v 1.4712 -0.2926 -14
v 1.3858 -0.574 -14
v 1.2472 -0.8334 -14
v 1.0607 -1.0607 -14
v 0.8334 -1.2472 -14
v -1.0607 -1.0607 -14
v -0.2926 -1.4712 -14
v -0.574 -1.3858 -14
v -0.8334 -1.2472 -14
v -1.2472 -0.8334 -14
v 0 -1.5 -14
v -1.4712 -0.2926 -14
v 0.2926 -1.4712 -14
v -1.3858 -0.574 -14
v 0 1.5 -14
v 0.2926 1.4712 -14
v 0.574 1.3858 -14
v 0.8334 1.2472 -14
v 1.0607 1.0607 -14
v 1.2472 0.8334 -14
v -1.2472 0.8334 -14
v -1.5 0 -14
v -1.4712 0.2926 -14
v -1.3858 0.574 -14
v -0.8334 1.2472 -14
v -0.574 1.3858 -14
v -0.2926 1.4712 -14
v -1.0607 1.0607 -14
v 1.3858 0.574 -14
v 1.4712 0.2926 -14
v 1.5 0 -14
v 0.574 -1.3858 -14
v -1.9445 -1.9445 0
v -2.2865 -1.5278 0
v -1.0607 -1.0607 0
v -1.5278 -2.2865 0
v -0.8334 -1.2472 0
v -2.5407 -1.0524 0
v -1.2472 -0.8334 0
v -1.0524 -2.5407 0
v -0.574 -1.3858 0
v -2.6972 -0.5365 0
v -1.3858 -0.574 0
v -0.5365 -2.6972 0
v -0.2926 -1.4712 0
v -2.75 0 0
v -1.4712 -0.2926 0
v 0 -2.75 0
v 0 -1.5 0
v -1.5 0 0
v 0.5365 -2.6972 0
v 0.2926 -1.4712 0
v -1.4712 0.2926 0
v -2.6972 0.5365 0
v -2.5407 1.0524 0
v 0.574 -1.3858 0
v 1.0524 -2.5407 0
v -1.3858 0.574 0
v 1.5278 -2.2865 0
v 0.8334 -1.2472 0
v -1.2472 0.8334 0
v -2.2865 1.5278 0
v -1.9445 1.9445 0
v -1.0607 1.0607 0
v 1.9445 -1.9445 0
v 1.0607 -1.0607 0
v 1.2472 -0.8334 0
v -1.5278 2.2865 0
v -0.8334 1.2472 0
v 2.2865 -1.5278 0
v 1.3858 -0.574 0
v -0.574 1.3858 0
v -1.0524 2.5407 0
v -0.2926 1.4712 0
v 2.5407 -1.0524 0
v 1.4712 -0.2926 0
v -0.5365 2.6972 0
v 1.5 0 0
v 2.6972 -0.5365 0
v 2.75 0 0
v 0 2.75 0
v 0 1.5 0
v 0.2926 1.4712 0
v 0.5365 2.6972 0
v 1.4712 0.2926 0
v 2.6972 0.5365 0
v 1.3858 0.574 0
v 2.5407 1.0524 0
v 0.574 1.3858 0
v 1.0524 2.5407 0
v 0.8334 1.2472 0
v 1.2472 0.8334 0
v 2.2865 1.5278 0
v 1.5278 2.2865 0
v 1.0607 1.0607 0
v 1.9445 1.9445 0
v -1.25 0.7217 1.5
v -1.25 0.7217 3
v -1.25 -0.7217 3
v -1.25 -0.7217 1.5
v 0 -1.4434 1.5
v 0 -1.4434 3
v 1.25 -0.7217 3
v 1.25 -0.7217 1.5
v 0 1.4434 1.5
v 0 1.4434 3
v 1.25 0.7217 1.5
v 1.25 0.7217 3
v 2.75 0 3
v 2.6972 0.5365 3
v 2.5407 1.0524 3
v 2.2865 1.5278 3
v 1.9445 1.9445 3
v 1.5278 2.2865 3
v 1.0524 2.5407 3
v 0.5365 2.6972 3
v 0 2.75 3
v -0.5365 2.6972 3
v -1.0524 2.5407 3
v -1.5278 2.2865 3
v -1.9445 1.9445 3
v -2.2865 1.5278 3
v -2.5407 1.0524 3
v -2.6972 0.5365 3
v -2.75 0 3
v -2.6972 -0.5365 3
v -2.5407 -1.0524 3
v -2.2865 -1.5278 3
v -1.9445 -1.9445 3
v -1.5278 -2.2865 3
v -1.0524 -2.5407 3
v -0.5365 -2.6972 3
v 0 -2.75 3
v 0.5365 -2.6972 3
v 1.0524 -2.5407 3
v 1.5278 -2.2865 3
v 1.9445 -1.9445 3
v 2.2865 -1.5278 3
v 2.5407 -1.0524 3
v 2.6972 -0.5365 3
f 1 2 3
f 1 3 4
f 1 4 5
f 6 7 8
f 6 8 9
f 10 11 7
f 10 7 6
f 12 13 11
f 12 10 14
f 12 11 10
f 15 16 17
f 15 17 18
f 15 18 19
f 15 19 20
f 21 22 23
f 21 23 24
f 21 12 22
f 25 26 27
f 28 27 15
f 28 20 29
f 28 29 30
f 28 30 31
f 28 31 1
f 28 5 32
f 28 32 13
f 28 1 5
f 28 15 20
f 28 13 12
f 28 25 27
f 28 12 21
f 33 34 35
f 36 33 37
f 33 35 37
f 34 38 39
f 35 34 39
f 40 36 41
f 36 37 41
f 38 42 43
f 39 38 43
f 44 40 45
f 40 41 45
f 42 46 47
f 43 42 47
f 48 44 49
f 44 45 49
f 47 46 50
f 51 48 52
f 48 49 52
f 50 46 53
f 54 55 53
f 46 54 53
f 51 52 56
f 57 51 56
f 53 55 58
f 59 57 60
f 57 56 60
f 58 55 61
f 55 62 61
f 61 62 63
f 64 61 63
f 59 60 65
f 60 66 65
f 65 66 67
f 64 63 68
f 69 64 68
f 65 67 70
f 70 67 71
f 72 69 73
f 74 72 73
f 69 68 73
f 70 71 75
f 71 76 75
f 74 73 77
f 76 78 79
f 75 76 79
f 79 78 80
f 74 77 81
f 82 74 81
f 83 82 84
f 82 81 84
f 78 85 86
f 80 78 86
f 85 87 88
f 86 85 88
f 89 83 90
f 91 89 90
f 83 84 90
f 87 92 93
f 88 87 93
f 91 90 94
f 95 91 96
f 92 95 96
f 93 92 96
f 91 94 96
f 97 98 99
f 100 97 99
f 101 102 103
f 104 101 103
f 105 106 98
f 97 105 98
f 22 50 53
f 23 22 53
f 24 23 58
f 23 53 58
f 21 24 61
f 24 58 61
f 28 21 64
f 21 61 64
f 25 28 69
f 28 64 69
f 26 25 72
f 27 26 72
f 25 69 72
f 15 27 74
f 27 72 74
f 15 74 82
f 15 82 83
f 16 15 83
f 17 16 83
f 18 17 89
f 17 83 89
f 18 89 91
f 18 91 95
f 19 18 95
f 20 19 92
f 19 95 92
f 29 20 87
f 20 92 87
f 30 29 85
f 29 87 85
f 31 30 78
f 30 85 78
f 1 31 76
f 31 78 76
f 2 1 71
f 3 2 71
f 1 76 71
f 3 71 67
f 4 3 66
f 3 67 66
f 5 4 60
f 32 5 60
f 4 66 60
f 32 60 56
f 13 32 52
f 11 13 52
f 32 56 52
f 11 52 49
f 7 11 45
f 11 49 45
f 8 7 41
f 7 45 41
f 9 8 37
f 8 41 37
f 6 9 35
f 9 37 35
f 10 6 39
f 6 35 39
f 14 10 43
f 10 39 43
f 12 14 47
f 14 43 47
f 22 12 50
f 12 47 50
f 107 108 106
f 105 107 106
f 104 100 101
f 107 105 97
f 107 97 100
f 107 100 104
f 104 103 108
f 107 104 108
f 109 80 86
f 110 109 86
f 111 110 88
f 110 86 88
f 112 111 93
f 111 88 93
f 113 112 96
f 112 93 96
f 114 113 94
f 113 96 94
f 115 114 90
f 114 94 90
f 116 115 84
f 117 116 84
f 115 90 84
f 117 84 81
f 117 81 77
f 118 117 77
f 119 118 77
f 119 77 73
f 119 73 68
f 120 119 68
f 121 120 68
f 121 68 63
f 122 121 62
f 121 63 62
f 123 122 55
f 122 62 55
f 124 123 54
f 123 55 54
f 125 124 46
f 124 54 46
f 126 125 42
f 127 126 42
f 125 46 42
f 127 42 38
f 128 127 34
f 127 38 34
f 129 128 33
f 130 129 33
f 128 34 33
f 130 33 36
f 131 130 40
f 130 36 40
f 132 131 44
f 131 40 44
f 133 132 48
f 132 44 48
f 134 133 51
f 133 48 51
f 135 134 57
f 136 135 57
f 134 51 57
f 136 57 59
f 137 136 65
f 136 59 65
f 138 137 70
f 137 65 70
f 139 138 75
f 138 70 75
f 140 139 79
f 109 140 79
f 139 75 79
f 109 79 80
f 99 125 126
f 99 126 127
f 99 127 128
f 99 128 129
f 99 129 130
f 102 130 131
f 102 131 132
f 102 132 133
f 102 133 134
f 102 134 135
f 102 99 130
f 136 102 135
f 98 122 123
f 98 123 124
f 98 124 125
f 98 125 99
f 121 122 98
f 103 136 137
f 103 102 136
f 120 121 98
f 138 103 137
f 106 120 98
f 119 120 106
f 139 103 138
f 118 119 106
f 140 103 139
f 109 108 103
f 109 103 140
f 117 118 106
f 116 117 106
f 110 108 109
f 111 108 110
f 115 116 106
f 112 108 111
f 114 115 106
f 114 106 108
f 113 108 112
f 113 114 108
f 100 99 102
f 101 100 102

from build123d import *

# Parameters (mm, degrees)
SKETCH_1_R          = 2.75
EXTRUDE_1_DEPTH     = 3
CUT_EXTRUDE_1_DEPTH = 1.5
SKETCH_3_R          = 1.5
EXTRUDE_2_DEPTH     = 14


with BuildPart() as part:
    # 草图1 → 凸台-拉伸1 (new body)
    with BuildSketch(Plane.XY):
        Circle(SKETCH_1_R)
    extrude(amount=EXTRUDE_1_DEPTH)

    # 草图2 → 切除-拉伸1 (cut)
    with BuildSketch(Plane.XY.offset(3)):
        Polygon((0, -1.443375673), (1.25, -0.721687836), (1.25, 0.721687836), (0, 1.443375673), (-1.25, 0.721687836), (-1.25, -0.721687836), align=None)
    extrude(amount=-CUT_EXTRUDE_1_DEPTH, mode=Mode.SUBTRACT)

    # 草图3 → 凸台-拉伸2 (add)
    with BuildSketch(Plane(origin=(0, 0, 0), x_dir=(-1, 0, 0), z_dir=(0, 0, -1))):
        Circle(SKETCH_3_R)
    extrude(amount=EXTRUDE_2_DEPTH)


solid = part.part
